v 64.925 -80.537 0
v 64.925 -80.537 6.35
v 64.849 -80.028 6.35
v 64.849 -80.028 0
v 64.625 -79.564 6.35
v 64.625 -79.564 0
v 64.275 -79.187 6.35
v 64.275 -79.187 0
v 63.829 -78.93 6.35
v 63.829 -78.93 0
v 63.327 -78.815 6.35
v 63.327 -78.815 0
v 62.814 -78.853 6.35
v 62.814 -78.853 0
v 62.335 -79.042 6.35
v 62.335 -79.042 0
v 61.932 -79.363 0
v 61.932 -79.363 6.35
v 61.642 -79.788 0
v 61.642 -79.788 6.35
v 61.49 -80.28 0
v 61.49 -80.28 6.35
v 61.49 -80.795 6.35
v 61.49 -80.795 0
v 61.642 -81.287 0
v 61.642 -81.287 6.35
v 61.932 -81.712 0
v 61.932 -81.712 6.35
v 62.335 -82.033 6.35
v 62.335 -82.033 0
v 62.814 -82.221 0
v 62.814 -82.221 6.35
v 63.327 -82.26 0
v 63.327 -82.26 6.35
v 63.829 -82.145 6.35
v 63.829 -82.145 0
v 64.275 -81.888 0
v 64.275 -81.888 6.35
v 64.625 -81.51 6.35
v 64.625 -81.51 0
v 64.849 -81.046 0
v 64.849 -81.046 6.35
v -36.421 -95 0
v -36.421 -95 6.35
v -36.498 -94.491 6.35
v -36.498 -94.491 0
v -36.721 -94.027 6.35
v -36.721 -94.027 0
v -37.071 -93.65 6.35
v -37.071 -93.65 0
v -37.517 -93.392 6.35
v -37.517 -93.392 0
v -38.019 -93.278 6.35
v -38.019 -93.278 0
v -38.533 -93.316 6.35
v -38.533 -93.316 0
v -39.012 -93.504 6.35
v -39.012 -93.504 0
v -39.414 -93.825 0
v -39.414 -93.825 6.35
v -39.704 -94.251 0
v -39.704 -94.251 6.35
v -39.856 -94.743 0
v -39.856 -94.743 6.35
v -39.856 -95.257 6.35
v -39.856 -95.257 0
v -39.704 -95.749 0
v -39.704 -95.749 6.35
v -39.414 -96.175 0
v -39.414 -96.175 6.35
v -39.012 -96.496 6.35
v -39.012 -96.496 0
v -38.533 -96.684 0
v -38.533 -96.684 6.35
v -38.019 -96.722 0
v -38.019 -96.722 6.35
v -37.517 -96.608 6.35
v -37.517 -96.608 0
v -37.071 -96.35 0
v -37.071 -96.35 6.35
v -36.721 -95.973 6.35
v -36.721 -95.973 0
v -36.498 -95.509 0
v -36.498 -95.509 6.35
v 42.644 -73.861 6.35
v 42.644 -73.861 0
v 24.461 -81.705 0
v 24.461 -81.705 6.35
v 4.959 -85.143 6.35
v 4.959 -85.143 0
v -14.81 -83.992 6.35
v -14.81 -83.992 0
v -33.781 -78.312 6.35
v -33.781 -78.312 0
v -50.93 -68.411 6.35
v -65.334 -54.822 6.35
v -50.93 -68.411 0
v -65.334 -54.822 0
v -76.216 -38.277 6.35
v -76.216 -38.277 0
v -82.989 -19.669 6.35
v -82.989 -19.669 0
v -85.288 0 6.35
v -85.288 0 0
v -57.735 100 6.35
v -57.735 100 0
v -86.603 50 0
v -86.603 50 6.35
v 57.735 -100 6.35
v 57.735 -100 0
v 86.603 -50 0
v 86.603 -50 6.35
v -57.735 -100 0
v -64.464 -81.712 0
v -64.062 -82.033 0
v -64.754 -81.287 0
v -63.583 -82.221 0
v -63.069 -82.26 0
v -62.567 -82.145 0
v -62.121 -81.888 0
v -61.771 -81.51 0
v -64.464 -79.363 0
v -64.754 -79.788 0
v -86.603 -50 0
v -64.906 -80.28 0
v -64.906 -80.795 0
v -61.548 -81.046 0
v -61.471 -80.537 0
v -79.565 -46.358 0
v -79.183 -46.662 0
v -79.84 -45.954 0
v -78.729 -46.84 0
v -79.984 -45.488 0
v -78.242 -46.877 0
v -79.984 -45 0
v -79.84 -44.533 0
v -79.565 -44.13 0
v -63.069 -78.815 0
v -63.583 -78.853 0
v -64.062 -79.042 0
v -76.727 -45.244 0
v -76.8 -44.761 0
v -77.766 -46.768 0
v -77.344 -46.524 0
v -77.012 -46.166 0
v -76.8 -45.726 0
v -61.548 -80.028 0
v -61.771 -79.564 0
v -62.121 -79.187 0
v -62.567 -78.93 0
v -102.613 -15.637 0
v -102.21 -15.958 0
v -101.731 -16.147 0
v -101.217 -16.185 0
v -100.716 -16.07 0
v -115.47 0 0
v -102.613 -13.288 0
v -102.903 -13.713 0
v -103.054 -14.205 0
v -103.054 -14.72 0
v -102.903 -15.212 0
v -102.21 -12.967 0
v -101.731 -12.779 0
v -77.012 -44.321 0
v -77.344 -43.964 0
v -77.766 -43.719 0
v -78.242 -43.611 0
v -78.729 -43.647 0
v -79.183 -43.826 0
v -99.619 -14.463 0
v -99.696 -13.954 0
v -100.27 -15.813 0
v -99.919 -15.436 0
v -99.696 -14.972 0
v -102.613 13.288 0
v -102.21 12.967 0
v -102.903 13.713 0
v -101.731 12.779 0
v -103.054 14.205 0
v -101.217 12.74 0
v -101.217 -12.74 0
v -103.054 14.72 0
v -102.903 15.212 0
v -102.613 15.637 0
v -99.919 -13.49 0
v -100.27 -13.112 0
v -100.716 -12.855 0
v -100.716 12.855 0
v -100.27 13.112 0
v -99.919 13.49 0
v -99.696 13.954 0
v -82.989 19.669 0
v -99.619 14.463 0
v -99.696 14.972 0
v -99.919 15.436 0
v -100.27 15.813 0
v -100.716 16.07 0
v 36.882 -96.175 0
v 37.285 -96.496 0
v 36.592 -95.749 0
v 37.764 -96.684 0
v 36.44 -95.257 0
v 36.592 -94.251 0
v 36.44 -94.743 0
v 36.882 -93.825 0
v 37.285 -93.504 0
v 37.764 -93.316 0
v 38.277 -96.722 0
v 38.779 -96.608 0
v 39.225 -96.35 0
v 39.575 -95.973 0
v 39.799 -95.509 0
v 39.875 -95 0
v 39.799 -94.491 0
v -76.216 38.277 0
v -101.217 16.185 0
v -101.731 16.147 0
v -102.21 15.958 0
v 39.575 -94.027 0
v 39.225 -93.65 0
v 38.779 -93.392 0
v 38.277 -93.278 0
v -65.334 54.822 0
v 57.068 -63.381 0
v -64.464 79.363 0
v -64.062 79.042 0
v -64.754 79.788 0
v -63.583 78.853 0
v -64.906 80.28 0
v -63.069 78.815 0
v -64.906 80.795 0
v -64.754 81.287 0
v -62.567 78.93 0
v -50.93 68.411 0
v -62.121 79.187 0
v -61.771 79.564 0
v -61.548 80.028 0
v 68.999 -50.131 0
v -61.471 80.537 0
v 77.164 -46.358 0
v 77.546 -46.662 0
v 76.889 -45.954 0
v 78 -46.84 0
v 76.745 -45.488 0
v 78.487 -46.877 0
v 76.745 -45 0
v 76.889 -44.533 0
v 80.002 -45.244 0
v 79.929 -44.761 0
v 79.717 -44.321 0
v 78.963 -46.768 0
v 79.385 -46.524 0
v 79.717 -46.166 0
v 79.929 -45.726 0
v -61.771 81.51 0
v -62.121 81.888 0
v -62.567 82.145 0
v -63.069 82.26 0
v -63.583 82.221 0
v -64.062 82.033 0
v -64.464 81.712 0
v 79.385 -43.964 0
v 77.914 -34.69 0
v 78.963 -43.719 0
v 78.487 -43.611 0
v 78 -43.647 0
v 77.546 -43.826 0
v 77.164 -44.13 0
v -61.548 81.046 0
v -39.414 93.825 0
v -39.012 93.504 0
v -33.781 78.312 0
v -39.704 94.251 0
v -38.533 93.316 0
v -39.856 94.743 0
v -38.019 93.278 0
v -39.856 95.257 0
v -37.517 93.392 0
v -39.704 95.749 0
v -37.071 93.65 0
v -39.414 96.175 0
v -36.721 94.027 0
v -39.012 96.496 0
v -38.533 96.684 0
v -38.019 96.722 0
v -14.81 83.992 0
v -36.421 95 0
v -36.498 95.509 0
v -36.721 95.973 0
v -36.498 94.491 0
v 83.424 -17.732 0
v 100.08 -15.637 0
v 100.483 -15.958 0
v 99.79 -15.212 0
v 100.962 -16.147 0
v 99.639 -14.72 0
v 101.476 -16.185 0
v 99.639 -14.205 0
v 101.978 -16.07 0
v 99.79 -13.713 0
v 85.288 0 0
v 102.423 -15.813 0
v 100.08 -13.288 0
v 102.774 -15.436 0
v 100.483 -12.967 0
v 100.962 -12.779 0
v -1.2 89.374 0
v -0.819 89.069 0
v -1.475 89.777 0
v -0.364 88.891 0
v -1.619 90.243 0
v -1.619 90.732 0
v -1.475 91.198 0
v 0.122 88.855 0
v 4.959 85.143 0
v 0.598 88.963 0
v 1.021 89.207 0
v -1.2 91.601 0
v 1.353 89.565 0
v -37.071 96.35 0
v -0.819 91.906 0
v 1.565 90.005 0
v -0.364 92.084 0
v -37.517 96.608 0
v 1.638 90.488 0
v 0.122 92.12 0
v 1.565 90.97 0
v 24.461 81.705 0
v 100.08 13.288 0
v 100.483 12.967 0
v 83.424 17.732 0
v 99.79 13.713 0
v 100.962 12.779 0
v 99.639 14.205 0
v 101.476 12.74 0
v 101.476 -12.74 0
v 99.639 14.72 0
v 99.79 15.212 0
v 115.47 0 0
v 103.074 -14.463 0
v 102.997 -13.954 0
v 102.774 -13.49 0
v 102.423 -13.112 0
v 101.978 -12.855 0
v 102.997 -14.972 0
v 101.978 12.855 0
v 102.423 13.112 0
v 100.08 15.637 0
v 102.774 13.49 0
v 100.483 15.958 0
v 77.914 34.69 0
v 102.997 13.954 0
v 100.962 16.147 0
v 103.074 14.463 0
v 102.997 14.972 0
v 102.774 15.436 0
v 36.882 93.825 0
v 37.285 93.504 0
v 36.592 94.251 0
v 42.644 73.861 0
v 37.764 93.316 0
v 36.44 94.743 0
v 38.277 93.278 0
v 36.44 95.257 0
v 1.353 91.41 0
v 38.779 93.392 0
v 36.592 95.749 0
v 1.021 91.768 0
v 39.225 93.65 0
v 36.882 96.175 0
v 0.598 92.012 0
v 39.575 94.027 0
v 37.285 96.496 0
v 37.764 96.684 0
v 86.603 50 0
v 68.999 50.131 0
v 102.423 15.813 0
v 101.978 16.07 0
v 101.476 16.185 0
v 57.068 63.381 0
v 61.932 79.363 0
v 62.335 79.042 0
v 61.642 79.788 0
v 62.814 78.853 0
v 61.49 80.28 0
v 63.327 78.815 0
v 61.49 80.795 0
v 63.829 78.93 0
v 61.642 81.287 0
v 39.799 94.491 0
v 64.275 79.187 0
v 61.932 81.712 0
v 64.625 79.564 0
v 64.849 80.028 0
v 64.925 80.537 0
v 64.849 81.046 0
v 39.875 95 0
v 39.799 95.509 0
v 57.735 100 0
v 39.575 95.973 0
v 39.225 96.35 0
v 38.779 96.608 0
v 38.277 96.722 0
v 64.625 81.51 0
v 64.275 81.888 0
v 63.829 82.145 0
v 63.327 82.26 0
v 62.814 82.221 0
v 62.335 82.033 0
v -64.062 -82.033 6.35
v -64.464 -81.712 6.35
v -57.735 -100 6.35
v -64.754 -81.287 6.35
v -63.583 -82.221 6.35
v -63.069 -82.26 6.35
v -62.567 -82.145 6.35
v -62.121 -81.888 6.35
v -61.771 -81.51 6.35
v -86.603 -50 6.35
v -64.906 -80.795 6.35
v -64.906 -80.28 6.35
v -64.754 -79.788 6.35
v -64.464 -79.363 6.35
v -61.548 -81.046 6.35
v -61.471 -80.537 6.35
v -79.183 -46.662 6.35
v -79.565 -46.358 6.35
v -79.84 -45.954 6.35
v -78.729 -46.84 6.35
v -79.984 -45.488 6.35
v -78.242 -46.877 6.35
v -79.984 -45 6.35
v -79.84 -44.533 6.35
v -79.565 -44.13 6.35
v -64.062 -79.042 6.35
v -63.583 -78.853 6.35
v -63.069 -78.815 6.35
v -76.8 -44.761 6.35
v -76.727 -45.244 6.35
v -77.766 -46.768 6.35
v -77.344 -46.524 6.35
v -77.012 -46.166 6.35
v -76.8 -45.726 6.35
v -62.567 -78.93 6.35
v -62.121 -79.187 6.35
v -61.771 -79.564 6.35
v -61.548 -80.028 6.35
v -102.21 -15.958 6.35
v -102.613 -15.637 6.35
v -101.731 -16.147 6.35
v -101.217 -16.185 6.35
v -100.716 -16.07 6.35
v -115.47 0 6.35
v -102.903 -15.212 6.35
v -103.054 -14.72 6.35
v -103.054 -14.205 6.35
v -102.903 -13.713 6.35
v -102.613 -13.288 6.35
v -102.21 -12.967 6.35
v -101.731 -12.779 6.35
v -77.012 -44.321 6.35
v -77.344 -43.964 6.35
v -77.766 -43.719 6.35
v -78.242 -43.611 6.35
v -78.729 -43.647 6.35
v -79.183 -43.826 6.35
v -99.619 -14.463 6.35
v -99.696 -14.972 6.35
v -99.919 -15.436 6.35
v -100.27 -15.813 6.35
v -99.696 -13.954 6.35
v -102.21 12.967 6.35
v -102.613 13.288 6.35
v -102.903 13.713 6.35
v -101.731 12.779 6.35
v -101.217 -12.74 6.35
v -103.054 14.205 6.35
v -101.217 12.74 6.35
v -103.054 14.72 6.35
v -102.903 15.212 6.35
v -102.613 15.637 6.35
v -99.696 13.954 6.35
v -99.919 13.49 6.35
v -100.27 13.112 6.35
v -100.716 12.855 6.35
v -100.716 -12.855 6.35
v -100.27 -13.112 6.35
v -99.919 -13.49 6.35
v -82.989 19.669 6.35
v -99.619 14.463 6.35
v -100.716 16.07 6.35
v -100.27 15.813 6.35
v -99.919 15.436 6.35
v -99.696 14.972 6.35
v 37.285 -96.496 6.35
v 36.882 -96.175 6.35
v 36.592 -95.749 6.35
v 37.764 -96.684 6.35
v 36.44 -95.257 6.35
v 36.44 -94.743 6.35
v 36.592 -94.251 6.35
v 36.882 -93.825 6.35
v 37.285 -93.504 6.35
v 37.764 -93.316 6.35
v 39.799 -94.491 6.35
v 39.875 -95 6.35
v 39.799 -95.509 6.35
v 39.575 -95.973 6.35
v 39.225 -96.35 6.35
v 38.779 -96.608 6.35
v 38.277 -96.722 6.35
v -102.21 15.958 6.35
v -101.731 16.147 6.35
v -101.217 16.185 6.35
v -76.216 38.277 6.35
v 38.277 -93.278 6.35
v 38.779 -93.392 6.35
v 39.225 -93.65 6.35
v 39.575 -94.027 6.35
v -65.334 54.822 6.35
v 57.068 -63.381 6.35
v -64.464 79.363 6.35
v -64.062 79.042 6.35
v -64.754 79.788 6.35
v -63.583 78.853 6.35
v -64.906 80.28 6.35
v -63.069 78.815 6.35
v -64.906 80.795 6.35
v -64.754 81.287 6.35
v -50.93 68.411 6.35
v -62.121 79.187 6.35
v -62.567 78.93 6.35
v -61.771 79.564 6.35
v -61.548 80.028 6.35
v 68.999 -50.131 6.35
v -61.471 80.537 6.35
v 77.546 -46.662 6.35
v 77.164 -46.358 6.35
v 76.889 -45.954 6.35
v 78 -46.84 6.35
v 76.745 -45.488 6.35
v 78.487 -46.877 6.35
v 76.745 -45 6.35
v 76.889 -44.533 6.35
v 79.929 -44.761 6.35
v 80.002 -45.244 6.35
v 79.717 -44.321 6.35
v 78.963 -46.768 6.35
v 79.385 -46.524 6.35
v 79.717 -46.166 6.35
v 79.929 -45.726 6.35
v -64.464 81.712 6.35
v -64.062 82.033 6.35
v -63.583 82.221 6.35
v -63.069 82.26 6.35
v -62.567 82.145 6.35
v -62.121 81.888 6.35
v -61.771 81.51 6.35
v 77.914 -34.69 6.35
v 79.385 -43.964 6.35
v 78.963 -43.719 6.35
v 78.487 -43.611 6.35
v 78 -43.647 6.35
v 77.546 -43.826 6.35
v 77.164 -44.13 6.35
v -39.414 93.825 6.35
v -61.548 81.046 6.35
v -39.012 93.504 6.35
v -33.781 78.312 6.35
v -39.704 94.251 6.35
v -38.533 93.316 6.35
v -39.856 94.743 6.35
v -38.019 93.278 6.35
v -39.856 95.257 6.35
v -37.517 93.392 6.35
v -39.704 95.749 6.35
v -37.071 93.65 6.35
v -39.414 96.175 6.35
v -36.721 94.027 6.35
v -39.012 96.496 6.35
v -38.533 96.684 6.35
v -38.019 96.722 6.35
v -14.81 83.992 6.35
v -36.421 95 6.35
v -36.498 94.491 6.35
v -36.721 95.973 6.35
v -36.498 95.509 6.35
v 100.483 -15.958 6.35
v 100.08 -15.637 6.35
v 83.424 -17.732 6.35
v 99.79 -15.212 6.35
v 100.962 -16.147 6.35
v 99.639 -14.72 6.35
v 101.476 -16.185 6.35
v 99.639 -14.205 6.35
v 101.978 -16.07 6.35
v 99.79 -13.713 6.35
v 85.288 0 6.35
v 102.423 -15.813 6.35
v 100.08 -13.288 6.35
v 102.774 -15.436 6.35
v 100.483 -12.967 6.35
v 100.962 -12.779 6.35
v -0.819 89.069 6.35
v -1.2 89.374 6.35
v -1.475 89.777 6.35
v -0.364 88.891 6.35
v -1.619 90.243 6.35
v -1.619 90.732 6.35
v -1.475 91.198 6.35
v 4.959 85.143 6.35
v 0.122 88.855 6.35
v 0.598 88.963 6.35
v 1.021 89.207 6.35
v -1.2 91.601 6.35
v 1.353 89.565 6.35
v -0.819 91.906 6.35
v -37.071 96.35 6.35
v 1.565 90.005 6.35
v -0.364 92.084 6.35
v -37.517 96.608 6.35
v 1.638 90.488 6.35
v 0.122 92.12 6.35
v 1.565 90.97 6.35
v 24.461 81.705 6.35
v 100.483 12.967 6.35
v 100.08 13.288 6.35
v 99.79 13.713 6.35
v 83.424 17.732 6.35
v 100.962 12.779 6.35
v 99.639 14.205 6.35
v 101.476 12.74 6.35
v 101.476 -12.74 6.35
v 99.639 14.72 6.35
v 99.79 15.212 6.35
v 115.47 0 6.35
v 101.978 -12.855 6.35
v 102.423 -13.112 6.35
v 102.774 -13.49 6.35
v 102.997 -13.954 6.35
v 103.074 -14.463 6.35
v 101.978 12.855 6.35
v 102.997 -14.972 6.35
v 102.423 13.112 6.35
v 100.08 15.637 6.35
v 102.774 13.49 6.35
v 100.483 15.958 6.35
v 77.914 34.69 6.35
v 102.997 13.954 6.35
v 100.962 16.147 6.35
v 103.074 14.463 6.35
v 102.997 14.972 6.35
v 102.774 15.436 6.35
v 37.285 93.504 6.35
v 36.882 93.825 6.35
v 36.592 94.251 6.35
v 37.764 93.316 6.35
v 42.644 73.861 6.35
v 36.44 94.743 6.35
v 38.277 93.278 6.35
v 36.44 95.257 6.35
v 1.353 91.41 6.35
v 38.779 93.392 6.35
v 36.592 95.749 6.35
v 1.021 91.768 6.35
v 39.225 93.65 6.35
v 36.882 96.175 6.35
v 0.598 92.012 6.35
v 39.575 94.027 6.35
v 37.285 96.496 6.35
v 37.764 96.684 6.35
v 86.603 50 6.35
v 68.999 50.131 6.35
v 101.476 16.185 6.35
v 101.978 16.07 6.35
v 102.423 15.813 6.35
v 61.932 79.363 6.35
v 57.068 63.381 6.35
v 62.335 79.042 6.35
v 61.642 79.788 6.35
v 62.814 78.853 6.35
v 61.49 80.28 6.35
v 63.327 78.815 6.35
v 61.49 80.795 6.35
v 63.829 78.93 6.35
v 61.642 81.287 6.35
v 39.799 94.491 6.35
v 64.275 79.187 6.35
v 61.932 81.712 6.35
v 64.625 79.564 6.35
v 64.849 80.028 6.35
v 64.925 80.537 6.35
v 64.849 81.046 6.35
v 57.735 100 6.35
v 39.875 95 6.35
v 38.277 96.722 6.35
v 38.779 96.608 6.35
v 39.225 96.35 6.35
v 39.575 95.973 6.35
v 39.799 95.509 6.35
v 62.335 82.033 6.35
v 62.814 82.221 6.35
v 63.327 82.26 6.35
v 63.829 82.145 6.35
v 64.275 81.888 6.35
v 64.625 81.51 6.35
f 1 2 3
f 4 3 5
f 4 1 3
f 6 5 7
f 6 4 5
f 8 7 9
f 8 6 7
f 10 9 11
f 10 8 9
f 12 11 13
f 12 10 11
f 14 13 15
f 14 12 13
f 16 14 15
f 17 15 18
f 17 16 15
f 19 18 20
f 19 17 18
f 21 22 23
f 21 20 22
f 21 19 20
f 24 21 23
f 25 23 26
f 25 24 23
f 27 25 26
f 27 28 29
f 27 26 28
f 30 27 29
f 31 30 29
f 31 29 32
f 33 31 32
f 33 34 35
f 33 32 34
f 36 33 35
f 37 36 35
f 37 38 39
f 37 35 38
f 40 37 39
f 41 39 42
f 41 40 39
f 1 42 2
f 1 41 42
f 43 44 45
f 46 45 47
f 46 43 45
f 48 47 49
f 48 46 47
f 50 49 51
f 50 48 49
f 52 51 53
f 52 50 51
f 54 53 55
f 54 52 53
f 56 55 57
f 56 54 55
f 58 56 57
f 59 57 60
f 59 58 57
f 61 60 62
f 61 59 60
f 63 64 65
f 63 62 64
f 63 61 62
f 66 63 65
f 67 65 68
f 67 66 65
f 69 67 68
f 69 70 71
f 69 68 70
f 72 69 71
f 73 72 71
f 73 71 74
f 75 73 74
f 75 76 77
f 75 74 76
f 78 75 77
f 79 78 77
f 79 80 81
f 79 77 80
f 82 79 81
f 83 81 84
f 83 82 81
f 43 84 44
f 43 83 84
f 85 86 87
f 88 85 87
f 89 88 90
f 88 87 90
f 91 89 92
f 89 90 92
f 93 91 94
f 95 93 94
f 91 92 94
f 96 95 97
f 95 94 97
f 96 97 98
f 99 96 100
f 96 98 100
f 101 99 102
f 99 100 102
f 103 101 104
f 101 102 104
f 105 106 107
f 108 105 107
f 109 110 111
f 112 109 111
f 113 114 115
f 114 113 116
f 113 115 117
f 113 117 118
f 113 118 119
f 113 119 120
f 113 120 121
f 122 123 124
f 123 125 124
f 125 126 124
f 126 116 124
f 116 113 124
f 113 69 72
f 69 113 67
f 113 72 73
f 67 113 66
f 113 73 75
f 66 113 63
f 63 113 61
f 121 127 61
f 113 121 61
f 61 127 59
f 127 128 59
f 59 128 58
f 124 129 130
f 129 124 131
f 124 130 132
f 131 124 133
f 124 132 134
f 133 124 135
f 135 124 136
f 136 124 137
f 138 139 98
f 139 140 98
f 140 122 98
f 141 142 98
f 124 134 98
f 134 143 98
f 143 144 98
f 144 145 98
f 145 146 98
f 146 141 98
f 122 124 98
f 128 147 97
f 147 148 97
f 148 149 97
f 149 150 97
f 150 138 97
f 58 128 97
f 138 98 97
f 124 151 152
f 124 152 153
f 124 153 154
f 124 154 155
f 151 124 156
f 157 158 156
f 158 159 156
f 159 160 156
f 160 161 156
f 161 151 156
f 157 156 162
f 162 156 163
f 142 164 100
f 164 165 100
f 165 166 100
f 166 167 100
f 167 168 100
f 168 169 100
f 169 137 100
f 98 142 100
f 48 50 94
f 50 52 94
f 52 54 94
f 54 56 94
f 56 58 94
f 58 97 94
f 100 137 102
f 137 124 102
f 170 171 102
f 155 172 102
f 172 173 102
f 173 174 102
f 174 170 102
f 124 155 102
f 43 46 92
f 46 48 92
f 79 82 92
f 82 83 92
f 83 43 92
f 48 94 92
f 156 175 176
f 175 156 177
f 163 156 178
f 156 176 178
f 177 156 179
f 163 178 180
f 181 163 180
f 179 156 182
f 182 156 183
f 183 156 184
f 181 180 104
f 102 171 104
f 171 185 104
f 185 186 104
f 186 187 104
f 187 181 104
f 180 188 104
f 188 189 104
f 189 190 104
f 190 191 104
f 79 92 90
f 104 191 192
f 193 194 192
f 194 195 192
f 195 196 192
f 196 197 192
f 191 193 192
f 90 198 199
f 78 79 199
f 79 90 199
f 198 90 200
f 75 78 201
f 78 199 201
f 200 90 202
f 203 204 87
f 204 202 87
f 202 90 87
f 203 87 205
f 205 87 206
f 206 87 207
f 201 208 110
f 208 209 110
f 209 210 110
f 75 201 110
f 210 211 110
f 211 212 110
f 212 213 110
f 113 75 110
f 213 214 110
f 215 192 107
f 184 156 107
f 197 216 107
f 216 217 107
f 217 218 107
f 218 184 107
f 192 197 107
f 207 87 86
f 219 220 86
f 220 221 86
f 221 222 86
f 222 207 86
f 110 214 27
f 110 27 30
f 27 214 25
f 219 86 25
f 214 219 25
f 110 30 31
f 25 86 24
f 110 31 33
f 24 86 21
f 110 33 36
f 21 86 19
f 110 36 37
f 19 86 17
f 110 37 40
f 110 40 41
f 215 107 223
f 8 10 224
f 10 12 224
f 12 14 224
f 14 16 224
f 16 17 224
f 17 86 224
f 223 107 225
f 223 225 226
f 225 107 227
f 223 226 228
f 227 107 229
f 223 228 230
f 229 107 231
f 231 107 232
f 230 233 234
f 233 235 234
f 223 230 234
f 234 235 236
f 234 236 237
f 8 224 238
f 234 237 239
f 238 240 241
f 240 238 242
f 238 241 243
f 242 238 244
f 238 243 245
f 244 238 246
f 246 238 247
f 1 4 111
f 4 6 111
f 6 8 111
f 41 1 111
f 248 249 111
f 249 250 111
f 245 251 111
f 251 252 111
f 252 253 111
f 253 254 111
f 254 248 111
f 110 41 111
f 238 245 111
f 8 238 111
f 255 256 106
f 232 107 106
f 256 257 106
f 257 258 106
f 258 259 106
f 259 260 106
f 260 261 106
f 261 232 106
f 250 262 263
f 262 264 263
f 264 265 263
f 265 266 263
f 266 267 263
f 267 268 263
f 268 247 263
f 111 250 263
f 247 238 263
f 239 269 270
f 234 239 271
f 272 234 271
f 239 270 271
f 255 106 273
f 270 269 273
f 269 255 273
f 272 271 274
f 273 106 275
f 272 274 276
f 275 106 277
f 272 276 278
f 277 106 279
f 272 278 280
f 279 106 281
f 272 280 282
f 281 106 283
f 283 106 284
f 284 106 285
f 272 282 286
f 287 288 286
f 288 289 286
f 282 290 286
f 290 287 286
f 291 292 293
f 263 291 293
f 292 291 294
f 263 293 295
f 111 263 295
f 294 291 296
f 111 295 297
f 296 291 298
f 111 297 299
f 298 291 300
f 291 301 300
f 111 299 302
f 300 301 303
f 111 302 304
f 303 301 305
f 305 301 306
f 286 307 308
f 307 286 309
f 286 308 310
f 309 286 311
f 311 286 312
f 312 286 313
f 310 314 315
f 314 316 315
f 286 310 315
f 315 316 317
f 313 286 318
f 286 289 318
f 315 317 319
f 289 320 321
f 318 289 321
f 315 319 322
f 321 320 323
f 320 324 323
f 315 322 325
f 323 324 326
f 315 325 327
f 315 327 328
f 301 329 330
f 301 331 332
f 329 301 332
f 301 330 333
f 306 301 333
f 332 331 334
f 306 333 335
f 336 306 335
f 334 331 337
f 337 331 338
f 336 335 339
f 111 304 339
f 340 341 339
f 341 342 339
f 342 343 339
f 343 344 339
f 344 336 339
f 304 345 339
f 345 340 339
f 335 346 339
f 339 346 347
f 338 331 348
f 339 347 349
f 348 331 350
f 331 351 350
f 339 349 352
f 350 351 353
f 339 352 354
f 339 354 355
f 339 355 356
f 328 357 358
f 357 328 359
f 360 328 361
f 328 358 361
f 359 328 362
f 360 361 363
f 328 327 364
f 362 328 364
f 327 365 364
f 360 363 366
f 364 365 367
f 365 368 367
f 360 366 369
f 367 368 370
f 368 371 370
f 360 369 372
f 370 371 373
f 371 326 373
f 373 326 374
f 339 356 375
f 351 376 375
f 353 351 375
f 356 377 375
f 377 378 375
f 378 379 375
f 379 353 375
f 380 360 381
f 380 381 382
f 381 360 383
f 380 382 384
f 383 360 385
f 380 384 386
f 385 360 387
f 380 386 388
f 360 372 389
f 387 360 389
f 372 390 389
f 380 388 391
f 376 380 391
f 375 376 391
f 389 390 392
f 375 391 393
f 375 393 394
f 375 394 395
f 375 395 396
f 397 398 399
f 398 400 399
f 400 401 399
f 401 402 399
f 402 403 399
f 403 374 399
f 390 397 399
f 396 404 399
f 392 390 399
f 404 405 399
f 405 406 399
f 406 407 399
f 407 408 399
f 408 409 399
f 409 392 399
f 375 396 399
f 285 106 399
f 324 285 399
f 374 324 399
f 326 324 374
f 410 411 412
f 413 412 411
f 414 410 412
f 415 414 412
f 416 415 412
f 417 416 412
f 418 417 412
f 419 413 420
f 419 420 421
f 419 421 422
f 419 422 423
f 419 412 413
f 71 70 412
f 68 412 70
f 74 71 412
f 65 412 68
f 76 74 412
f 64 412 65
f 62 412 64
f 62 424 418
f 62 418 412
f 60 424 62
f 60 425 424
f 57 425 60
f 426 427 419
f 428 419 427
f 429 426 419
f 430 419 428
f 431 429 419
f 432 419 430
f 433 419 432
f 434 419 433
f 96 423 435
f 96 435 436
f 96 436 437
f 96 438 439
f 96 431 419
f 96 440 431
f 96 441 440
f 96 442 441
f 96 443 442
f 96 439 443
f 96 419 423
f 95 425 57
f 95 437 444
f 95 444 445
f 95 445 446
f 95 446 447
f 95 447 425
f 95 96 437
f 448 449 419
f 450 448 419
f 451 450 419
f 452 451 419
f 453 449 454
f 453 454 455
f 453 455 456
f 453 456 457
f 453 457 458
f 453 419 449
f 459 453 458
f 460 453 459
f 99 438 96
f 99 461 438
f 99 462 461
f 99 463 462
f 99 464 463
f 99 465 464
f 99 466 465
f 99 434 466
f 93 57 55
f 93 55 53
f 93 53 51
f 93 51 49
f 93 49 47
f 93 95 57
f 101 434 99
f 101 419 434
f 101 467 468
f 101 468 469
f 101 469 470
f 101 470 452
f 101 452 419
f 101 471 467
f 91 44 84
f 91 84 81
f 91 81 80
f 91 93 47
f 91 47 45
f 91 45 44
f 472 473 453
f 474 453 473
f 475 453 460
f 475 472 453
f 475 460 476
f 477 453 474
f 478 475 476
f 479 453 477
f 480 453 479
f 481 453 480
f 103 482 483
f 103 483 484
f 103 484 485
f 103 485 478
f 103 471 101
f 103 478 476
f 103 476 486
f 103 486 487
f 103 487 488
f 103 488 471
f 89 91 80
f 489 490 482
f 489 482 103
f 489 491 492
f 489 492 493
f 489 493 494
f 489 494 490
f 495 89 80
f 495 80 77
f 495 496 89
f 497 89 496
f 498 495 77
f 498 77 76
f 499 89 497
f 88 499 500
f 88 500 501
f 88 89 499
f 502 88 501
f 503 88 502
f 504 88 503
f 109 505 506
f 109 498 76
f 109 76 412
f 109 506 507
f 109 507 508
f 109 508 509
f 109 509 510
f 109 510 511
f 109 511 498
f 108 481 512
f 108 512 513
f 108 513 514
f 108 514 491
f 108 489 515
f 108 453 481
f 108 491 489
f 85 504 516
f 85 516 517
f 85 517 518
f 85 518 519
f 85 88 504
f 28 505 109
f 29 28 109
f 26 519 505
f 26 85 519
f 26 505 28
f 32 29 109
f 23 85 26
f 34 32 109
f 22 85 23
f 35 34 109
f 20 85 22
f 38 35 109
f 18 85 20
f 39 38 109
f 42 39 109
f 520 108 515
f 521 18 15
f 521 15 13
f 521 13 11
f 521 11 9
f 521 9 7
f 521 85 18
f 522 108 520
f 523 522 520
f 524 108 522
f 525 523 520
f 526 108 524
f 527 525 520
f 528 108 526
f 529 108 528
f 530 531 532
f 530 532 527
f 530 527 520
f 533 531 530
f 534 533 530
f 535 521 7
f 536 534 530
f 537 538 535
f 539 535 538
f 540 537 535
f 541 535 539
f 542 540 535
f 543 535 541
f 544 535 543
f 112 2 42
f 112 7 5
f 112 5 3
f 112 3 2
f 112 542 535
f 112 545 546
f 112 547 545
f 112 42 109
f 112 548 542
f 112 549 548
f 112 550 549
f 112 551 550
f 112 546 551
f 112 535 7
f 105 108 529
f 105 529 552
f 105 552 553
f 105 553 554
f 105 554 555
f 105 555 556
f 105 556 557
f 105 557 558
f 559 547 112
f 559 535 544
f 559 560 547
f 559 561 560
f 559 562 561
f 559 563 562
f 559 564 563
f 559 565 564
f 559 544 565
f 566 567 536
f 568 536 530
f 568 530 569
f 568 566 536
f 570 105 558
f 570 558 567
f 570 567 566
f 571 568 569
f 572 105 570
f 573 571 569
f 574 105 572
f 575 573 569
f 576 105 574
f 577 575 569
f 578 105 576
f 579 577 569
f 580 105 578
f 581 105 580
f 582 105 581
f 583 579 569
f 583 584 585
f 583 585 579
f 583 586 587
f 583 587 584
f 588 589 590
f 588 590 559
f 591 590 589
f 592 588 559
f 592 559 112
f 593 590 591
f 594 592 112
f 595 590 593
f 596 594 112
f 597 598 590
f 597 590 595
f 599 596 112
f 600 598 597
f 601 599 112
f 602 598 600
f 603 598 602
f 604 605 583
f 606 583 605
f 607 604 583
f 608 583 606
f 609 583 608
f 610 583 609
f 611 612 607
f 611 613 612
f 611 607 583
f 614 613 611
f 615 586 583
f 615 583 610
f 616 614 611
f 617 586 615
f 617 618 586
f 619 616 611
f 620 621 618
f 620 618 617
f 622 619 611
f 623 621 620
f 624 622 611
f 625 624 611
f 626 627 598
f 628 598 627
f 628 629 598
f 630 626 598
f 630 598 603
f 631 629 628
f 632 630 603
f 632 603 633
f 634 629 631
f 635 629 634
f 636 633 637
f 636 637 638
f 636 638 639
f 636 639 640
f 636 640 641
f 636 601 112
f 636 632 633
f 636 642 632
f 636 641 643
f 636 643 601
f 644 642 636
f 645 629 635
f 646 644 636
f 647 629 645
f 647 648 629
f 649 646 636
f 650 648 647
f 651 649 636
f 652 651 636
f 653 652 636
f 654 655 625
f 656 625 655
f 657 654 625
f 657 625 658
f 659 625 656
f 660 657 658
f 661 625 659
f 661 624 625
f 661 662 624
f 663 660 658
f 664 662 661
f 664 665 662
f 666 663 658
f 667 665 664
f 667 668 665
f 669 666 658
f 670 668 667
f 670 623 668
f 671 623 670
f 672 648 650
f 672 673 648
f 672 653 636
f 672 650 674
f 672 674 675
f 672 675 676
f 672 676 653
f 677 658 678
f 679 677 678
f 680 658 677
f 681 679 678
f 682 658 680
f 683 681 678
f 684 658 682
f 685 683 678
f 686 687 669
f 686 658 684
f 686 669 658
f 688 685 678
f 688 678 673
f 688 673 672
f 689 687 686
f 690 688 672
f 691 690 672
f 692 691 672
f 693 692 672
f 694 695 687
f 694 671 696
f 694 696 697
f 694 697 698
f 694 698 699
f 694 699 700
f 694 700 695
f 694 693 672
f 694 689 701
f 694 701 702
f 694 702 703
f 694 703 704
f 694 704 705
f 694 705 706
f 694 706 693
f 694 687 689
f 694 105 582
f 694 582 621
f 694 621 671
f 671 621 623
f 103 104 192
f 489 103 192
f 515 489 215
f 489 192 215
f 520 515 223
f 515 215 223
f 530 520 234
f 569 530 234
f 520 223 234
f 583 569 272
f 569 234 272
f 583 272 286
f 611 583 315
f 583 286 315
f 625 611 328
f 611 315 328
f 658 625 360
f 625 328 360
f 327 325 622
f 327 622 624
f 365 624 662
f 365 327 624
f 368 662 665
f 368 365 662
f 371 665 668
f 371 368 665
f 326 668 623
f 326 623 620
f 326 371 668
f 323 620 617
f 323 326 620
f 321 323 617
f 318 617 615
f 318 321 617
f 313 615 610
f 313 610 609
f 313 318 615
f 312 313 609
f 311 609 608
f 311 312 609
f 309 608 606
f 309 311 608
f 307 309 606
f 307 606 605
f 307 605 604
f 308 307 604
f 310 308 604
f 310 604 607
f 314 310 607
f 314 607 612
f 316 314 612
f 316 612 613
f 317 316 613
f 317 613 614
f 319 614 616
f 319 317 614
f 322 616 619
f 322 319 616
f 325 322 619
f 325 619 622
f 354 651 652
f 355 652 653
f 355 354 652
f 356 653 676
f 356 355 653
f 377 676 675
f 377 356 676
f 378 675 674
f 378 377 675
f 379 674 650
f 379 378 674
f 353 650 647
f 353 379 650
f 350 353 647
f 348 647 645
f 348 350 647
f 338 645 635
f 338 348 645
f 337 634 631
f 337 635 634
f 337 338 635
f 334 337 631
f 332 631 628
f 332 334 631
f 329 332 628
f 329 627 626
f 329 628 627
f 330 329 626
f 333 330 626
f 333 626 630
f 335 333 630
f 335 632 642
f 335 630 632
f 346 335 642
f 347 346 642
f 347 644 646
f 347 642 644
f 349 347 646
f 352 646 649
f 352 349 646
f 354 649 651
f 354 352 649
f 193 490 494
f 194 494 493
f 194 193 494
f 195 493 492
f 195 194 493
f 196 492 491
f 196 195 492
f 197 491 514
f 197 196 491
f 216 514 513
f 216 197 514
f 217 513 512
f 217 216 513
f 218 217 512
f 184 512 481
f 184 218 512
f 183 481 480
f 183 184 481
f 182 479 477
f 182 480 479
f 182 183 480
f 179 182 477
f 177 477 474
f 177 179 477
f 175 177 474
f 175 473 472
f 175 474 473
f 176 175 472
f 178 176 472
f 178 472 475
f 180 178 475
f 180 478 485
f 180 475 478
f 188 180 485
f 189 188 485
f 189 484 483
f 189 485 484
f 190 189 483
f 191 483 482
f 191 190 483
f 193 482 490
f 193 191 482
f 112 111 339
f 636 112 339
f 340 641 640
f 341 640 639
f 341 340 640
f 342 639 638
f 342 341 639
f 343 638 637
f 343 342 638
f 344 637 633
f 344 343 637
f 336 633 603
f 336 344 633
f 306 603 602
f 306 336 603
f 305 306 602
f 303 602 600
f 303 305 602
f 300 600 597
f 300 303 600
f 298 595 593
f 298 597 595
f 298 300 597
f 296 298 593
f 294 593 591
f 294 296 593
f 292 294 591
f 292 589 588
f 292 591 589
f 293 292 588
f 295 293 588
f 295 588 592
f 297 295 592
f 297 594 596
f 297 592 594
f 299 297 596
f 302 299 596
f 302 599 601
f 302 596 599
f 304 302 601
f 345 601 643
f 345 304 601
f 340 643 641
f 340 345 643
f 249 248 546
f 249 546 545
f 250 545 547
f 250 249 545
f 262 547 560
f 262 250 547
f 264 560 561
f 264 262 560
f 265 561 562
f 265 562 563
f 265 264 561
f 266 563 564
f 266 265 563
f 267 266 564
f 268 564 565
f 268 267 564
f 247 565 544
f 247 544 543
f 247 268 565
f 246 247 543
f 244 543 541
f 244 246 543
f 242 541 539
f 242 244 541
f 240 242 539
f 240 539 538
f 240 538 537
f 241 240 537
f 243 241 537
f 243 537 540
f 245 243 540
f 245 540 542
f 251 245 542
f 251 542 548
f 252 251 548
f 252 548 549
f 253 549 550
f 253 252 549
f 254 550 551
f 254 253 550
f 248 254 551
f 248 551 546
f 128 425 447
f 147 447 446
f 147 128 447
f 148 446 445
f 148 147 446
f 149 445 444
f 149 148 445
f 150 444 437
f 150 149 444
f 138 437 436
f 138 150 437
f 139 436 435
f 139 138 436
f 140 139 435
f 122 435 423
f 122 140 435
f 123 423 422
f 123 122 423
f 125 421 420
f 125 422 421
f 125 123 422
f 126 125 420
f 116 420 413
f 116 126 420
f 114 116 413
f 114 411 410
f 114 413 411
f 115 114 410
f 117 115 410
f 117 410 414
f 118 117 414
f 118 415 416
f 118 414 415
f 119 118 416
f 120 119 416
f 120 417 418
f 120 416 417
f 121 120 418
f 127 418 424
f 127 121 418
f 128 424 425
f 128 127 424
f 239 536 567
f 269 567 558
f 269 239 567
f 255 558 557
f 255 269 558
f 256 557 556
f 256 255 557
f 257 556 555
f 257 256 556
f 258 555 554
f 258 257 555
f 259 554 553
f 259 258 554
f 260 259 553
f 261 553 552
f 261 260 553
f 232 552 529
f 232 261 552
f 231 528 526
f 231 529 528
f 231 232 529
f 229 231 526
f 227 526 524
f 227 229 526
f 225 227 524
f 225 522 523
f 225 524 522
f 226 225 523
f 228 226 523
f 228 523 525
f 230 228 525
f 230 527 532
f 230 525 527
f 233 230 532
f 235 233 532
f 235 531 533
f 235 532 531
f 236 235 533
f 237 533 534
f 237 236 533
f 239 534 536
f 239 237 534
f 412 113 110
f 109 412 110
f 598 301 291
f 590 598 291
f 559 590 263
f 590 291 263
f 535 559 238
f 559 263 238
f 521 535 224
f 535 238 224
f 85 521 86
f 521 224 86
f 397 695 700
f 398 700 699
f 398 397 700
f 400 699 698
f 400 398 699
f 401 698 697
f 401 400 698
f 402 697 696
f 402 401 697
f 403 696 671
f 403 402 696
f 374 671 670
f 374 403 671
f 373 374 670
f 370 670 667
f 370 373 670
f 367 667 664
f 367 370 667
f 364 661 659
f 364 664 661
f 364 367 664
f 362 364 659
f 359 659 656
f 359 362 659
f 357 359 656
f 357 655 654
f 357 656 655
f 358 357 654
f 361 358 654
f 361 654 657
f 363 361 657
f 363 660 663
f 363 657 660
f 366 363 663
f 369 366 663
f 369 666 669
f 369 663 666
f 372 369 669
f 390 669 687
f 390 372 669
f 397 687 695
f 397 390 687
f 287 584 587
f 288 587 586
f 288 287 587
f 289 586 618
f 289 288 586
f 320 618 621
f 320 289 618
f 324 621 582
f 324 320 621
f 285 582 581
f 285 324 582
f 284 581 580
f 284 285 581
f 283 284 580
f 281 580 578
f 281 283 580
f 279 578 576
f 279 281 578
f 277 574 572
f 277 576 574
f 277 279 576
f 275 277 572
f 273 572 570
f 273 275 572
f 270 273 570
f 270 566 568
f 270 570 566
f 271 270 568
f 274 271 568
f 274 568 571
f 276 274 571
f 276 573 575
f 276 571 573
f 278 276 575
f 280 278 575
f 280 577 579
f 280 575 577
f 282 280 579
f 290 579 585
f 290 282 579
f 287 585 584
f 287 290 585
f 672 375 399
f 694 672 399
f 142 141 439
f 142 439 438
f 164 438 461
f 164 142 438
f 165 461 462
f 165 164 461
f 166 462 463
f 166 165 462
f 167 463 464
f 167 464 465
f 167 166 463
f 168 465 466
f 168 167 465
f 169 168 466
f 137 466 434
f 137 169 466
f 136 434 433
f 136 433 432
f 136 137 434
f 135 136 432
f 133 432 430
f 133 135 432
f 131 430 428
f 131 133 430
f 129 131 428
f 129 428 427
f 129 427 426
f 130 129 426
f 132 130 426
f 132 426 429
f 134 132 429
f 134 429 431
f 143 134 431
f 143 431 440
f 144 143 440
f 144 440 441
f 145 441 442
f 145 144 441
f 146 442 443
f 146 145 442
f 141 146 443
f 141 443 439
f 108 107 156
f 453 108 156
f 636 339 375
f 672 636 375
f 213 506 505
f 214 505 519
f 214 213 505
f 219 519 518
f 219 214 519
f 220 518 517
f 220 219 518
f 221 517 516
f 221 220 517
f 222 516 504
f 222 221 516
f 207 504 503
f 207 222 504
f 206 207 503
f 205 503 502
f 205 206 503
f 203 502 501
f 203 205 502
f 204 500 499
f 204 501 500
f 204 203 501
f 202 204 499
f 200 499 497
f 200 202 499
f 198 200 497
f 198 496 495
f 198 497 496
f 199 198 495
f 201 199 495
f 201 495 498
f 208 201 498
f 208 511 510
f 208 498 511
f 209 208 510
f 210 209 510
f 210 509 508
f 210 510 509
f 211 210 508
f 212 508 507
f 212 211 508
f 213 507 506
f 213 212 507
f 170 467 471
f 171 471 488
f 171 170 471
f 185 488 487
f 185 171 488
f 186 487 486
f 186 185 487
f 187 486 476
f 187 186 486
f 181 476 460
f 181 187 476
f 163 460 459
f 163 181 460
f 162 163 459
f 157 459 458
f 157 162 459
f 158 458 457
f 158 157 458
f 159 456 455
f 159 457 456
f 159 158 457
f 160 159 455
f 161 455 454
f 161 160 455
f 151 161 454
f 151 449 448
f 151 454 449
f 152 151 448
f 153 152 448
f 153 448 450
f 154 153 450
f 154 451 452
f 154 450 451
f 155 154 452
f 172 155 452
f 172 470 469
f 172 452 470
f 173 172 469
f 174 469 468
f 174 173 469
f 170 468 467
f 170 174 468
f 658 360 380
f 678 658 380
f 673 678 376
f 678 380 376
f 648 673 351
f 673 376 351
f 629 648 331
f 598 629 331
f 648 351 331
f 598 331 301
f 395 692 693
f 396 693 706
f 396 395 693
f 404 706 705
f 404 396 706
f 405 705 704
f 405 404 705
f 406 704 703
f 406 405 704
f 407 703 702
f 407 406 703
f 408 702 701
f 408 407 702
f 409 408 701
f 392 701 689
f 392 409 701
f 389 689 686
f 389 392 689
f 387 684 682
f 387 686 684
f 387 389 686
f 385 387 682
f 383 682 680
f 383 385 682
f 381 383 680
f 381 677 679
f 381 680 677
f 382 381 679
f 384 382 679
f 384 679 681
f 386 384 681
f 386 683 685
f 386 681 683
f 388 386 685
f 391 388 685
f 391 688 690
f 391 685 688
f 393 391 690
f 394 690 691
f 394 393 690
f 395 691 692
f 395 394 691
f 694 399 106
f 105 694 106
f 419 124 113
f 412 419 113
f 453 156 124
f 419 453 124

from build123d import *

# Parameters (mm, degrees)
F0_R     = 1.6375
F1_DEPTH = 6.35
F2_R     = 1.7272
F3_DEPTH = 25


with BuildPart() as f1:
    # F0 (on Top) → F1 (new body)
    with BuildSketch(Plane.XY):
        with BuildLine():
            ThreePointArc((86.602541, -50), (96.592583, -25.881904), (100, 0))
            ThreePointArc((100, 0), (96.592583, 25.881904), (86.602541, 49.999999))
            ThreePointArc((86.602541, 49.999999), (50.000001, 86.60254), (0, 100))
            ThreePointArc((0, 100), (-50.000001, 86.60254), (-86.602541, 49.999999))
            ThreePointArc((-86.602541, 49.999999), (-100, 1e-06), (-86.602542, -49.999998))
            ThreePointArc((-86.602542, -49.999998), (-50.000001, -86.60254), (0, -100))
            ThreePointArc((0, -100), (50, -86.60254), (86.602541, -50))
        make_face()
        with Locations((-78.364474, -45.24375)):
            Circle(F0_R, mode=Mode.SUBTRACT)
        with Locations((78.364474, -45.24375)):
            Circle(F0_R, mode=Mode.SUBTRACT)
        with BuildLine():
            ThreePointArc((42.64375, 73.861142), (73.861142, 42.64375), (85.2875, 0))
            ThreePointArc((85.2875, 0), (73.861142, -42.64375), (42.64375, -73.861142))
            ThreePointArc((42.64375, -73.861142), (-42.64375, -73.861142), (-85.2875, 0))
            ThreePointArc((-85.2875, 0), (-42.64375, 73.861142), (42.64375, 73.861142))
        make_face(mode=Mode.SUBTRACT)
        with Locations((0, 90.4875)):
            Circle(F0_R, mode=Mode.SUBTRACT)
        with BuildLine():
            ThreePointArc((86.602541, 49.999999), (96.592583, 25.881904), (100, 0))
            ThreePointArc((100, 0), (96.592583, -25.881904), (86.602541, -50))
            Line((86.602541, -50), (115.470054, 0))
            Line((115.470054, 0), (86.602541, 49.999999))
        make_face()
        with BuildLine():
            ThreePointArc((0, 100), (50.000001, 86.60254), (86.602541, 49.999999))
            Line((86.602541, 49.999999), (57.735027, 100))
            Line((57.735027, 100), (0, 100))
        make_face()
        with BuildLine():
            Line((57.735027, -100), (86.602541, -50))
            ThreePointArc((86.602541, -50), (50, -86.60254), (0, -100))
            Line((0, -100), (57.735027, -100))
        make_face()
        with BuildLine():
            ThreePointArc((-86.602541, 49.999999), (-50.000001, 86.60254), (0, 100))
            Line((0, 100), (-57.735027, 100))
            Line((-57.735027, 100), (-86.602541, 49.999999))
        make_face()
        with BuildLine():
            Line((-57.735027, -100), (0, -100))
            ThreePointArc((0, -100), (-50.000001, -86.60254), (-86.602542, -49.999998))
            Line((-86.602542, -49.999998), (-57.735027, -100))
        make_face()
        with BuildLine():
            ThreePointArc((-86.602542, -49.999998), (-100, 1e-06), (-86.602541, 49.999999))
            Line((-86.602541, 49.999999), (-115.470054, 0))
            Line((-115.470054, 0), (-86.602542, -49.999998))
        make_face()
    extrude(amount=F1_DEPTH)

    # F2 (on Top) → F3 (cut)
    with BuildSketch(Plane.XY):
        with Locations((38.148276, 95)):
            Circle(F2_R)
        with Locations((-38.148276, 95)):
            Circle(F2_R)
        with Locations((-63.198276, 80.537376)):
            Circle(F2_R)
        with Locations((-101.346551, 14.462624)):
            Circle(F2_R)
        with Locations((-101.346551, -14.462624)):
            Circle(F2_R)
        with Locations((-63.198276, -80.537376)):
            Circle(F2_R)
        with Locations((-38.148276, -95)):
            Circle(F2_R)
        with Locations((38.148276, -95)):
            Circle(F2_R)
        with Locations((63.198276, -80.537376)):
            Circle(F2_R)
        with Locations((101.346551, -14.462624)):
            Circle(F2_R)
        with Locations((101.346551, 14.462624)):
            Circle(F2_R)
        with Locations((63.198276, 80.537376)):
            Circle(F2_R)
    extrude(amount=F3_DEPTH, mode=Mode.SUBTRACT)


solid = f1.part
